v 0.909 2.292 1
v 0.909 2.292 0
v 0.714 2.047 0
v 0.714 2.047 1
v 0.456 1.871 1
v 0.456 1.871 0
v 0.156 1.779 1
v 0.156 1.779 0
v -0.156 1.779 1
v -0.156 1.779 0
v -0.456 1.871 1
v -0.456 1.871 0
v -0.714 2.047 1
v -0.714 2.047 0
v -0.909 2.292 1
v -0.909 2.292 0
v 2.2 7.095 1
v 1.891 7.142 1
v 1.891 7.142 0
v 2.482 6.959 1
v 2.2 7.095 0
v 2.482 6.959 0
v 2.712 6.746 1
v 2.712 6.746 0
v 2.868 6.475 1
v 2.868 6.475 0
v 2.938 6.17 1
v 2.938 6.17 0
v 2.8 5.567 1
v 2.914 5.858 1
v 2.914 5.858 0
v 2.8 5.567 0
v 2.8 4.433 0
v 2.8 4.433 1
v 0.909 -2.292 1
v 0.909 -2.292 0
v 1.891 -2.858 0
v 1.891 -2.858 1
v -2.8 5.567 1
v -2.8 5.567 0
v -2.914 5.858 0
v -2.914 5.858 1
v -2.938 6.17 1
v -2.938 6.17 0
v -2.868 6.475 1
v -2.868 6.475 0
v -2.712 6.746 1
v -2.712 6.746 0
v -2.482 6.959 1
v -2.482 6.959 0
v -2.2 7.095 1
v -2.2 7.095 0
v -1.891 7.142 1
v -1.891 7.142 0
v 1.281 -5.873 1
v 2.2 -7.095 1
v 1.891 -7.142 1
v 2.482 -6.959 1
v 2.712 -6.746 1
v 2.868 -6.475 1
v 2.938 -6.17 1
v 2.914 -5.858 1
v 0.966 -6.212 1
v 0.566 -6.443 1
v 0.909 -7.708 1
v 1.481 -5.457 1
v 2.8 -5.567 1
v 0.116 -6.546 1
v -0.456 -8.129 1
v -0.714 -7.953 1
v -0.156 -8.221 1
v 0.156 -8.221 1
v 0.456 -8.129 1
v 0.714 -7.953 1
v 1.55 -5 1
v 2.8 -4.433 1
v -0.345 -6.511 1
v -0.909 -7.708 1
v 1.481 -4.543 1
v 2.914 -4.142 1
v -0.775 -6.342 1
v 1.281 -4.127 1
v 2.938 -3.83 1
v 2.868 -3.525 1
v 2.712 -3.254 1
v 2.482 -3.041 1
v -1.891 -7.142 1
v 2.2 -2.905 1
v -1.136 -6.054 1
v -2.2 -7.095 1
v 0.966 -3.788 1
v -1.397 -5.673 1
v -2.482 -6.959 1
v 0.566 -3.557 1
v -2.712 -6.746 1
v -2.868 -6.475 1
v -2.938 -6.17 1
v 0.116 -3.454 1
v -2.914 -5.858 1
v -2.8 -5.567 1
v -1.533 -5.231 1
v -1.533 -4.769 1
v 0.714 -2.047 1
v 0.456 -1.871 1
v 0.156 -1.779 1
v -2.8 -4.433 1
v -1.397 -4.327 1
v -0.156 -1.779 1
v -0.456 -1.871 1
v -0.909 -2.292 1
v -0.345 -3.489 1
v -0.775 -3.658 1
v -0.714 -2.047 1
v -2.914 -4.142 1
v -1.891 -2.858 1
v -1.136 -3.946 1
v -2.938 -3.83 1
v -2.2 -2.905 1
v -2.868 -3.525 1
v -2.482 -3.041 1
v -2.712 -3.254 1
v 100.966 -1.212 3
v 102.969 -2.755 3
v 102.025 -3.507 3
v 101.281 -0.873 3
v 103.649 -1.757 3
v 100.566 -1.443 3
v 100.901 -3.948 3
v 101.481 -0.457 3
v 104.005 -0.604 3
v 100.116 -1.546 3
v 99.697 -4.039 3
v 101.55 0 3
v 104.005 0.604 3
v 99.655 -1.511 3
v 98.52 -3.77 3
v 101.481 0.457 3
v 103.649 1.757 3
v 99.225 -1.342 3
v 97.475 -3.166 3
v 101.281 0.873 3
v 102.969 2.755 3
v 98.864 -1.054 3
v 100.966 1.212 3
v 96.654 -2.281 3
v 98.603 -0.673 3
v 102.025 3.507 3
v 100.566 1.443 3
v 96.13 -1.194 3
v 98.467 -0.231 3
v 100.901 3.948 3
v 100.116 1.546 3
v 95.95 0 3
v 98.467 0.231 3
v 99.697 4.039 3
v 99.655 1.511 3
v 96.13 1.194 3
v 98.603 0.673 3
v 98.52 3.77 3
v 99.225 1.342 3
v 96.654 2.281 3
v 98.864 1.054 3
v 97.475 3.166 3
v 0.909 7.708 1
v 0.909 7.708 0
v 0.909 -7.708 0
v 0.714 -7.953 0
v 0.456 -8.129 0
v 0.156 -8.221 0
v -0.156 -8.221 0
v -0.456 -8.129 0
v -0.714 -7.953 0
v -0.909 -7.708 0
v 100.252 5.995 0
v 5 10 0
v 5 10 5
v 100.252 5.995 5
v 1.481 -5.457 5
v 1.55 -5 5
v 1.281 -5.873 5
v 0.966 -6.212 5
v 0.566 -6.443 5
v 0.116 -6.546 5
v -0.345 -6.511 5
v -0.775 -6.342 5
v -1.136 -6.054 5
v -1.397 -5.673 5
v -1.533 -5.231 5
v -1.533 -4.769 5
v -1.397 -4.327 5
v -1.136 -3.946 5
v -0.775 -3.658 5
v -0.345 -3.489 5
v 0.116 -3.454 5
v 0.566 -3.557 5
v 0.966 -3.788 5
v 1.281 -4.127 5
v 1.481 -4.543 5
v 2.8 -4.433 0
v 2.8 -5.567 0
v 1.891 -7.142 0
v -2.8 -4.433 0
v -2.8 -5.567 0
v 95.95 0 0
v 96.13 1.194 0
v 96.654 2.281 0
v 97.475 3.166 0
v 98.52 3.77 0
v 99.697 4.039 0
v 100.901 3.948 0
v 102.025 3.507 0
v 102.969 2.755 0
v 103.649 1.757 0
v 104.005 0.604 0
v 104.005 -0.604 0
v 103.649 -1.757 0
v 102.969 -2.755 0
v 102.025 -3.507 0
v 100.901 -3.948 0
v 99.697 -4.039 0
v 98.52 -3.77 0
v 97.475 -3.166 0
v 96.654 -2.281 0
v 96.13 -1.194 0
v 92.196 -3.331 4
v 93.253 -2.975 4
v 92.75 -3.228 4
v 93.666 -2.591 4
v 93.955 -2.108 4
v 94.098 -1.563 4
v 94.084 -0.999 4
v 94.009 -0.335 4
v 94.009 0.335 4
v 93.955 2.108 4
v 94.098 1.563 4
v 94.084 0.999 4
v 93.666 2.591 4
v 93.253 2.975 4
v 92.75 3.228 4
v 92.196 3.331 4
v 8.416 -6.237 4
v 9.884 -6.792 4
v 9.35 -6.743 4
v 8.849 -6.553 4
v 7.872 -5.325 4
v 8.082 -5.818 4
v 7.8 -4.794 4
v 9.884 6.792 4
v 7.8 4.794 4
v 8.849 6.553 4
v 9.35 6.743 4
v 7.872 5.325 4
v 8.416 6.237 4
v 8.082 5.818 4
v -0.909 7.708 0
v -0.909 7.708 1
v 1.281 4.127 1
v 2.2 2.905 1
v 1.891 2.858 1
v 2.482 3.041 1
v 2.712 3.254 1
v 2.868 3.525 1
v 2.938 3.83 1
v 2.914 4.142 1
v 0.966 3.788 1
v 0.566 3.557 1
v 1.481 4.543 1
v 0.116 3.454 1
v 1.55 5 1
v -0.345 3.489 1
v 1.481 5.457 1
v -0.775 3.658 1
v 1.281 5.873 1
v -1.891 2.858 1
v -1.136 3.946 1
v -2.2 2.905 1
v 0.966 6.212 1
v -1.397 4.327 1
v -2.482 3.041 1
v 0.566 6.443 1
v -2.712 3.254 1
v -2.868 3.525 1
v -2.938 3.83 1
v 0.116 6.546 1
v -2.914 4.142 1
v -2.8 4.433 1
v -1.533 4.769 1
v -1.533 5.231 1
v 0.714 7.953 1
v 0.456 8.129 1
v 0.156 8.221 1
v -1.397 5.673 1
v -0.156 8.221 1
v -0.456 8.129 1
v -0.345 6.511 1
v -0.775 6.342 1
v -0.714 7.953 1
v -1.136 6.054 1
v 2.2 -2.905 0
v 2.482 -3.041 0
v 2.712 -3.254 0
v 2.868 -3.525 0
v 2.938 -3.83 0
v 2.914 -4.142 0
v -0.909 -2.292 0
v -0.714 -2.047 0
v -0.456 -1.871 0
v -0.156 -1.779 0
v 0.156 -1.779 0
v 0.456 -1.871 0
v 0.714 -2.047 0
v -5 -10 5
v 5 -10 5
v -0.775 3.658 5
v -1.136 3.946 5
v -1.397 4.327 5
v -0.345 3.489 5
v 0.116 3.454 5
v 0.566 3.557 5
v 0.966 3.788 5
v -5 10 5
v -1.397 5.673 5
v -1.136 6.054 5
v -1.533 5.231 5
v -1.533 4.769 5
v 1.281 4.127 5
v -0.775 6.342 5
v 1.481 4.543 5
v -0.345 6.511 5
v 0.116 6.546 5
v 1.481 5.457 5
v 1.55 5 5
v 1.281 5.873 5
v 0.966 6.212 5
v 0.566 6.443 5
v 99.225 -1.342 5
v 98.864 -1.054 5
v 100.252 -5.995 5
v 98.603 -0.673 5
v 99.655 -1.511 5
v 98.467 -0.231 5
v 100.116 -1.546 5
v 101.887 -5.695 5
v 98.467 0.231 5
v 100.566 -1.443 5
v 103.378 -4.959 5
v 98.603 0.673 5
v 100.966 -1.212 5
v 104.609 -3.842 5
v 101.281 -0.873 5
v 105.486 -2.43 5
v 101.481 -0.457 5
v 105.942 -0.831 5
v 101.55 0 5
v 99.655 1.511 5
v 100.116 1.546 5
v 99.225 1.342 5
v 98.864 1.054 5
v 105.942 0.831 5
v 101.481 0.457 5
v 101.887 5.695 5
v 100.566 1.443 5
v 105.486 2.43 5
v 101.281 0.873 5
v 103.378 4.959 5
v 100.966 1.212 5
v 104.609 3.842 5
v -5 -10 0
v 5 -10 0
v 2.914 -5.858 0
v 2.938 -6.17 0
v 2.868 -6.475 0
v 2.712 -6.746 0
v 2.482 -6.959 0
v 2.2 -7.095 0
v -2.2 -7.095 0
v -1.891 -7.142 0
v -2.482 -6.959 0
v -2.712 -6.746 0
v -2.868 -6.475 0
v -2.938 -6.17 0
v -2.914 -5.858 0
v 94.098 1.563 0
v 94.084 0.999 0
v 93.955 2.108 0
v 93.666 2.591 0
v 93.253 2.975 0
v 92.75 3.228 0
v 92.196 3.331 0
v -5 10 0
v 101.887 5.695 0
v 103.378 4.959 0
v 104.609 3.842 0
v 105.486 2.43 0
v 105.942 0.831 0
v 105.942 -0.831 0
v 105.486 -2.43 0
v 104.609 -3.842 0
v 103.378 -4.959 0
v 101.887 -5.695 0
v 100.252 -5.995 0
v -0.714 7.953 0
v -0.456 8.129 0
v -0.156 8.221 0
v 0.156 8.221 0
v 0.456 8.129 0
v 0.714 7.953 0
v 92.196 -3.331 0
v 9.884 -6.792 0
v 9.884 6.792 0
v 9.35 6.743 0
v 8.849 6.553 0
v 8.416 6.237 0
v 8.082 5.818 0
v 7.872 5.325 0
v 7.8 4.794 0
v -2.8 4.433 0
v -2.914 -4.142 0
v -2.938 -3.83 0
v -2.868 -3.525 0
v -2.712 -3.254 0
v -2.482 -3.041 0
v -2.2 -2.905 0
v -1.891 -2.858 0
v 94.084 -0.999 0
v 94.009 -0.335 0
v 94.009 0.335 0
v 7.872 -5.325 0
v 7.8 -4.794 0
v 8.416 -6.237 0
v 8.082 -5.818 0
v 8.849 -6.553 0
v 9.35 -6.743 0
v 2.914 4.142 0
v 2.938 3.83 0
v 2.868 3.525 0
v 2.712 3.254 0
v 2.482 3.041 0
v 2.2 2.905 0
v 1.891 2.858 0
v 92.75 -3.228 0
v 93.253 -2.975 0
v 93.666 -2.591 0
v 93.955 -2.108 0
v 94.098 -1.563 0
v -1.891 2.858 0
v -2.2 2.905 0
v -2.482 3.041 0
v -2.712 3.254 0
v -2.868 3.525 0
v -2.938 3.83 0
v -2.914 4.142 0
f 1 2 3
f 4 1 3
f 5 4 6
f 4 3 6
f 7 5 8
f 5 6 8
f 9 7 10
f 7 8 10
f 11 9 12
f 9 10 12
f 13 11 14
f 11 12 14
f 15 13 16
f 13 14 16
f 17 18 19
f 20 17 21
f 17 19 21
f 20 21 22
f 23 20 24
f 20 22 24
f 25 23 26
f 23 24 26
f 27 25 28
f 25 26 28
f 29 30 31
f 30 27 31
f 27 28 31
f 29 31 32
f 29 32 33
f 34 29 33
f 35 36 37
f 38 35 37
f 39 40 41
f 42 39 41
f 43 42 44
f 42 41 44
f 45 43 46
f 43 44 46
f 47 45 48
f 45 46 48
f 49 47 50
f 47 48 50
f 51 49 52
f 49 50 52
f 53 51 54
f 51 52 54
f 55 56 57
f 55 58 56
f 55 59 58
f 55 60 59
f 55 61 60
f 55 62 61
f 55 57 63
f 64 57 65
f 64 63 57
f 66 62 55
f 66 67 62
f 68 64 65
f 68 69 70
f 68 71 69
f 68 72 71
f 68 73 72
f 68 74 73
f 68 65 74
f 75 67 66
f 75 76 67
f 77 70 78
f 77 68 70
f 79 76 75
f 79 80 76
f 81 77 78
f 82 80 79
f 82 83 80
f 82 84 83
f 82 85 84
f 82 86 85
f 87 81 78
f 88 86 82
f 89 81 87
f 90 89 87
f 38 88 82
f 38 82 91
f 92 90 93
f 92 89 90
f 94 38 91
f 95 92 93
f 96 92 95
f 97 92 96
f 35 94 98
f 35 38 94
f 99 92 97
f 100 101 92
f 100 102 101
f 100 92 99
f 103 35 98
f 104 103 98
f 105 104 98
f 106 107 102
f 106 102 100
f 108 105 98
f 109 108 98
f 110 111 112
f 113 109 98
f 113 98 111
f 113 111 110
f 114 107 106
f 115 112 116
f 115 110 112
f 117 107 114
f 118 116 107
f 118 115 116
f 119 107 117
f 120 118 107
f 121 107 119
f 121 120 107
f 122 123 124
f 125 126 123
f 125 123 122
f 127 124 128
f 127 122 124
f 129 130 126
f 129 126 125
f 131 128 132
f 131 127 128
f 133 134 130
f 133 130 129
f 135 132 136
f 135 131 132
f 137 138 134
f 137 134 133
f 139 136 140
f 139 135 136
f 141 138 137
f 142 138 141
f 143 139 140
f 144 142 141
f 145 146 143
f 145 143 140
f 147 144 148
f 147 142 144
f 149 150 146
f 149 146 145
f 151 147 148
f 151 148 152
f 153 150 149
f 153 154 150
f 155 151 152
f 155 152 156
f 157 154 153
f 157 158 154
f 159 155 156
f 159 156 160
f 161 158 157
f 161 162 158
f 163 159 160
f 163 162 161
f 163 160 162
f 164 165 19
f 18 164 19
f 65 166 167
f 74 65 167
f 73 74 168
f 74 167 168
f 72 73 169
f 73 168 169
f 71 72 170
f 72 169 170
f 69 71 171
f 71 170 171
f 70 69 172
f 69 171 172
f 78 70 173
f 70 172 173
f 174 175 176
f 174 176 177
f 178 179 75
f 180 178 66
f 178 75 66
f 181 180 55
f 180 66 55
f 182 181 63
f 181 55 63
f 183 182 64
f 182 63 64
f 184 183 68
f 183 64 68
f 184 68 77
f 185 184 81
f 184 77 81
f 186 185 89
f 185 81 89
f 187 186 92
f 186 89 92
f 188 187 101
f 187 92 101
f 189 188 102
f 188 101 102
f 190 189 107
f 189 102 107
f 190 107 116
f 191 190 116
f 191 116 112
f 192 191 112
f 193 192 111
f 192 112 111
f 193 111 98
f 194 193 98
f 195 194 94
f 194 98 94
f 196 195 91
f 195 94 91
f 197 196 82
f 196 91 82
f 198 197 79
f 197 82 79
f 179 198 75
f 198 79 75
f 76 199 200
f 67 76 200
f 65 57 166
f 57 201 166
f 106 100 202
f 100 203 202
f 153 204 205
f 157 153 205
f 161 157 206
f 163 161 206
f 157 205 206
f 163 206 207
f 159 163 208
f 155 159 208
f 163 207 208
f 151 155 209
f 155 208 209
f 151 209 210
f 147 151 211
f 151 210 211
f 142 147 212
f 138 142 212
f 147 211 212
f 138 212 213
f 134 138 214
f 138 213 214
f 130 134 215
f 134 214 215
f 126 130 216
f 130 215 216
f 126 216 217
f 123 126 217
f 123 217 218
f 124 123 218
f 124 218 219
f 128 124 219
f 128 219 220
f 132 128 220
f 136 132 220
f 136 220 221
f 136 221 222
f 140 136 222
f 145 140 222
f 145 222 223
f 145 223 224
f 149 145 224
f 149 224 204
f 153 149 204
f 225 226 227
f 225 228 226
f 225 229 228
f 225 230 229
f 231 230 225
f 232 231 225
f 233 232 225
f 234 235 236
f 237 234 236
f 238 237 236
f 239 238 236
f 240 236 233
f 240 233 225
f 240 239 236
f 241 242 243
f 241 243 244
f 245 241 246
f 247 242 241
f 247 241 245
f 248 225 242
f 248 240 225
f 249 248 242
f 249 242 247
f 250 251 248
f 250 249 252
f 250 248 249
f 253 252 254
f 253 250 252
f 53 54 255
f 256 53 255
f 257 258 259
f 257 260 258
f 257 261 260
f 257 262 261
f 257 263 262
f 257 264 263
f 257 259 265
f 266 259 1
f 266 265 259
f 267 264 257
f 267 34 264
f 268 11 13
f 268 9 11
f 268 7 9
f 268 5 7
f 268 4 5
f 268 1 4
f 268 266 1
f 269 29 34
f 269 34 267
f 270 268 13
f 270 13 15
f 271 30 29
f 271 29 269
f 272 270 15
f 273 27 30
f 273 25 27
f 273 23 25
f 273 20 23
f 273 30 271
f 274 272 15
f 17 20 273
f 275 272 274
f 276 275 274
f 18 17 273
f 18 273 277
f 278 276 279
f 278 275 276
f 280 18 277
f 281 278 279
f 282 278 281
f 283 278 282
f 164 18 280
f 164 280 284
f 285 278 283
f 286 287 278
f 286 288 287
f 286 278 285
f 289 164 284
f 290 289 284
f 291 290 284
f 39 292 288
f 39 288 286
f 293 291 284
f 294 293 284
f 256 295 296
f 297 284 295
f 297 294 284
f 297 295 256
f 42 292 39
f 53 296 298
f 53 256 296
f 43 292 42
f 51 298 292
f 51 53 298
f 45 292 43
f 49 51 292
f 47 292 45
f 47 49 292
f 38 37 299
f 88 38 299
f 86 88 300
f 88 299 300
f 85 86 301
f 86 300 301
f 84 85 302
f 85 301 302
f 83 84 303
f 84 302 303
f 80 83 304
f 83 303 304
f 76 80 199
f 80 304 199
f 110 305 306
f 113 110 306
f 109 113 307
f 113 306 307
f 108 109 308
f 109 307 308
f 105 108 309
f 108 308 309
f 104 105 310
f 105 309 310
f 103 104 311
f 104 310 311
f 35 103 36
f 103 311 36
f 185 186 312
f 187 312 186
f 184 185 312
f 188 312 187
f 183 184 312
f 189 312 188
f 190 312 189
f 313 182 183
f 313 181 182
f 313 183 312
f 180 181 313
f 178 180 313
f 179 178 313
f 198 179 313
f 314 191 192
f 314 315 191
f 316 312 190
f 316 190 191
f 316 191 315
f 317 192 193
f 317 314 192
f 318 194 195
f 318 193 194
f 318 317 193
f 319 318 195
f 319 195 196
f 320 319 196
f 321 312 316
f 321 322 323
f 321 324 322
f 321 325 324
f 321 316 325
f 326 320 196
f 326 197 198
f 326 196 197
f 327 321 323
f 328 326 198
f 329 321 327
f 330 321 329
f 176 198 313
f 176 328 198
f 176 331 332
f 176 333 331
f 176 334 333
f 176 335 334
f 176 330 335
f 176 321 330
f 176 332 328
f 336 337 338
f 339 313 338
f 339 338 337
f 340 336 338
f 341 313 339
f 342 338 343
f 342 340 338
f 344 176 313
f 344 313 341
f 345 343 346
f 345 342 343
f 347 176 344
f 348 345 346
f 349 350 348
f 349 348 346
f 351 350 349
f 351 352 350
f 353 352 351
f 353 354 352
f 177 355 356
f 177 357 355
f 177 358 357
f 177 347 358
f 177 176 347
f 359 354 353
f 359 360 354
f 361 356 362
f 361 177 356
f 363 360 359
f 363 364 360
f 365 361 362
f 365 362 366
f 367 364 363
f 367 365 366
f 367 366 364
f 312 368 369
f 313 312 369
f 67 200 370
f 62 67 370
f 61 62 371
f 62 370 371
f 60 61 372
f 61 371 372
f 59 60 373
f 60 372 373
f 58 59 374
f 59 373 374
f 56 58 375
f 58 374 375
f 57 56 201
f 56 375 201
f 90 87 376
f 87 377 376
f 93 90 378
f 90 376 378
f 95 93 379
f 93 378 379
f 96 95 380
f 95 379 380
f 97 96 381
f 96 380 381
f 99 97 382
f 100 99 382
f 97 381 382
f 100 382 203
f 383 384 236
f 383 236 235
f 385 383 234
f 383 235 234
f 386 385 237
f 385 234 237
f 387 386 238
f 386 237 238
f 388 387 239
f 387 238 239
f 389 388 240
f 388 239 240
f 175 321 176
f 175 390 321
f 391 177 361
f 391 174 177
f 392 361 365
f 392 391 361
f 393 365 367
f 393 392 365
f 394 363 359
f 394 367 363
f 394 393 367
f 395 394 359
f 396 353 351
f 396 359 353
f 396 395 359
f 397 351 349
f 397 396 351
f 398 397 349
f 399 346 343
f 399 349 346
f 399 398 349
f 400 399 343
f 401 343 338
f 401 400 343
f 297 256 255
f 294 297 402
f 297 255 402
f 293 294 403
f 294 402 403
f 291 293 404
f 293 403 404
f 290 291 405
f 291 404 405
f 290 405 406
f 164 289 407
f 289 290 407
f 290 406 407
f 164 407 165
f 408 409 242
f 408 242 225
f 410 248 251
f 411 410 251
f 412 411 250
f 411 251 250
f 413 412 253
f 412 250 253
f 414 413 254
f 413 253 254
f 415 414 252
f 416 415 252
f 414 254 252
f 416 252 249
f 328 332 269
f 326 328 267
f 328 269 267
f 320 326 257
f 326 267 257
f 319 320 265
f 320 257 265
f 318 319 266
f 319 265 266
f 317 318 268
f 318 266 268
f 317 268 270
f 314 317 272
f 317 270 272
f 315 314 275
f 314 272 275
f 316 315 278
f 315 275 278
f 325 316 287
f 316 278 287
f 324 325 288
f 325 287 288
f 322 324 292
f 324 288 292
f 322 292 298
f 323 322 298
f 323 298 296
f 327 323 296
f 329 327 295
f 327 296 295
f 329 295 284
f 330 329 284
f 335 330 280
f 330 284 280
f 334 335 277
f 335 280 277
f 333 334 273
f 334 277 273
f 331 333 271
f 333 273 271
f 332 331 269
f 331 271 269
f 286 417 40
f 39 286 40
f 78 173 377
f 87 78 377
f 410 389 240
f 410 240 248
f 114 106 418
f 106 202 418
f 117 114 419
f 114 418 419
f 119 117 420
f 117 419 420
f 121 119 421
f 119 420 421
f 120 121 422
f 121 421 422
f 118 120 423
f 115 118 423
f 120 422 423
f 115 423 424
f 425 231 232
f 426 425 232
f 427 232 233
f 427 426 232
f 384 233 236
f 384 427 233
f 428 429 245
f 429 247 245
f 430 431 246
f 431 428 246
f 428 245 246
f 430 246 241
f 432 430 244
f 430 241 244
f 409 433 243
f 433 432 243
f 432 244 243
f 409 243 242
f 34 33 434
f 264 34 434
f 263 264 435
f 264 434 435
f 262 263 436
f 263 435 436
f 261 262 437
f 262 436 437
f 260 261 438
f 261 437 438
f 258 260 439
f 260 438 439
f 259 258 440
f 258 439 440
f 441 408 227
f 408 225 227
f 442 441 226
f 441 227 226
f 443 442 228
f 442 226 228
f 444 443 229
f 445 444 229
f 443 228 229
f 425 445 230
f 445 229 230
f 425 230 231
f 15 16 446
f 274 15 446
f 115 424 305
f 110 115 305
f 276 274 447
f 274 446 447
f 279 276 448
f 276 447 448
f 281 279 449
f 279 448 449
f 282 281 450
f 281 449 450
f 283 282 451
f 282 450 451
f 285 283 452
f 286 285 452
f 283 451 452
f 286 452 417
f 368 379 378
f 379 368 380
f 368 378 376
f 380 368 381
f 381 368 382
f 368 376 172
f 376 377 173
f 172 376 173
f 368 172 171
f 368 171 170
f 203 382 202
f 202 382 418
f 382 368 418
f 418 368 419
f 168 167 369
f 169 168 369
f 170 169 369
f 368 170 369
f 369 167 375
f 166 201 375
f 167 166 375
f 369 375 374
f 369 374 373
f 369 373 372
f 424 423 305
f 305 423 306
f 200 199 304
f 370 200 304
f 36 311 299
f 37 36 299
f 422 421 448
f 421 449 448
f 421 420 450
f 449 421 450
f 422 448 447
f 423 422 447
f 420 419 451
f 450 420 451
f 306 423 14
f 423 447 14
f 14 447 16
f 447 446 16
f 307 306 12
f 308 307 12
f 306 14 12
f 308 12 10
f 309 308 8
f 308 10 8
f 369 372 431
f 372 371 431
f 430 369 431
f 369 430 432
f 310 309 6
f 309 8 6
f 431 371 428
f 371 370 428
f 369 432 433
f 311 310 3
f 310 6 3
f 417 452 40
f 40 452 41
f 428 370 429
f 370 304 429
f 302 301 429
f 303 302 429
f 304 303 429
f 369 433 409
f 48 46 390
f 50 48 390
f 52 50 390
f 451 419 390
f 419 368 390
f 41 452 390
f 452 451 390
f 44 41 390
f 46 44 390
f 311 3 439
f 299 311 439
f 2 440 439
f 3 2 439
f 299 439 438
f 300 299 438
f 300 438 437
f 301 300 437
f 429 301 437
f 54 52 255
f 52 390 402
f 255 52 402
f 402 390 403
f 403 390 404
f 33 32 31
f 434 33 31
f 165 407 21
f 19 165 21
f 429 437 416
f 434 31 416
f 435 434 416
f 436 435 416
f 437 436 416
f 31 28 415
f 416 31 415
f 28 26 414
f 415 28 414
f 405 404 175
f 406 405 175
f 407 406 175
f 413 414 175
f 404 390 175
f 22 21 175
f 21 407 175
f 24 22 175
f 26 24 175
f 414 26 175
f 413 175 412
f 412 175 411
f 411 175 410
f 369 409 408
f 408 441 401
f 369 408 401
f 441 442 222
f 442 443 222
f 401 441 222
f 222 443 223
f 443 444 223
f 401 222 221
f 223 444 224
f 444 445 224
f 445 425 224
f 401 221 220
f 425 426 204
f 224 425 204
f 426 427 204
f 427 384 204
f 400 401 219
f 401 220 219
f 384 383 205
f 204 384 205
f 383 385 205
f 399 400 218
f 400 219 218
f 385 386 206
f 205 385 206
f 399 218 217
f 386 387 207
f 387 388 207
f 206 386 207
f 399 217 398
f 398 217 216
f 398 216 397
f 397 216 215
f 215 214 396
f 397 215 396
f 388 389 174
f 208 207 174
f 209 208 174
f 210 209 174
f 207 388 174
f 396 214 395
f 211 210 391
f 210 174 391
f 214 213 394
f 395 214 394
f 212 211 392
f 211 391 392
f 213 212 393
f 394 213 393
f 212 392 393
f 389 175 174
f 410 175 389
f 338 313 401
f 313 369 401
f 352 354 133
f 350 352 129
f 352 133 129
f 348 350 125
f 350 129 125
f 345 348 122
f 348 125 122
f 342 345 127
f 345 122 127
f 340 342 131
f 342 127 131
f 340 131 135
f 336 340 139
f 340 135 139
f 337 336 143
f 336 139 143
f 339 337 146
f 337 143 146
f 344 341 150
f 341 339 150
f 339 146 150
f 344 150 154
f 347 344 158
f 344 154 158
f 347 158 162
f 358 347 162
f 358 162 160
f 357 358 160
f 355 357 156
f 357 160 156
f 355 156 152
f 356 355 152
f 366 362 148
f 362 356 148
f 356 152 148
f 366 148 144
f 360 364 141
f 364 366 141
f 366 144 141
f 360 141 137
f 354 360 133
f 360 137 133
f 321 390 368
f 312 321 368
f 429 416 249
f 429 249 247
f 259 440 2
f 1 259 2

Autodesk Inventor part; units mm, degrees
ref_plane "YZ Plane" through (0, 0, 0) normal (1, 0, 0) x (0, 1, 0)
ref_plane "XZ Plane" through (0, 0, 0) normal (0, 1, 0) x (-1, 0, 0)
ref_plane "XY Plane" through (0, 0, 0) normal (0, 0, 1) x (1, 0, 0)
sketch "スケッチ1" plane through (0, 0, 0) normal (0, 0, 1) x (1, 0, 0)
  circle A0 centre (0, 5) radius 1.55
  circle A1 centre (0, -5) radius 1.55
  line L0 (0, 5) -> (0, -5) construction
  line L1 (0, 0) -> (100, 0) construction
  circle A2 centre (100, 0) radius 1.55
  line L2 (-5, 10) -> (-5, -10)
  line L3 (-5, -10) -> (5, -10)
  line L4 (5, -10) -> (100.2521, -5.9947)
  line L5 (-5, 10) -> (5, 10)
  line L6 (5, 10) -> (100.2521, 5.9947)
  arc A3 (100.2521, -5.9947) -> (100.2521, 5.9947) centre (100, 0) ccw
  circle A4 centre (0, 5) radius 3 construction
  circle A5 centre (0, 5) radius 5 construction
  line L7 (5, 10) -> (5, -10) construction
  point P0 (-5, 0)
  dimension "d0" = 10
  dimension "d1" = 3.1
  dimension "d2" = 3.1
  dimension "d3" = 100
  dimension "d4" = 6
  dimension "d5" = 6
  dimension "d6" = 2
extrude "押し出し1" add sketch "スケッチ1" along normal blind 5
sketch "スケッチ2" plane through (0, 0, 0) normal (0, 0, -1) x (-1, 0, 0)
  circle A0 centre (-100, 0) radius 1.55 projected
  arc A1 (-100.2521, 5.9947) -> (-100.2521, -5.9947) centre (-100, 0) ccw projected
  circle A2 centre (-100, 0) radius 4.05
  point P0 (0, 0)
  dimension "d9" = 8.1
extrude "押し出し2" cut sketch "スケッチ2" against normal blind 3
sketch "スケッチ3" plane through (0, 0, 0) normal (0, 0, -1) x (-1, 0, 0)
  circle A0 centre (0, -5) radius 1.55 projected
  circle A1 centre (0, 5) radius 1.55 projected
  line L0 (0, -1.8246) -> (2.75, -3.4123)
  line L1 (2.75, -3.4123) -> (2.75, -6.5877)
  line L2 (2.75, -6.5877) -> (0, -8.1754)
  line L3 (0, -8.1754) -> (-2.75, -6.5877)
  line L4 (-2.75, -6.5877) -> (-2.75, -3.4123)
  line L5 (-2.75, -3.4123) -> (0, -1.8246)
  line L6 (-2.75, 6.5877) -> (0, 8.1754)
  line L7 (0, 8.1754) -> (2.75, 6.5877)
  line L8 (2.75, 6.5877) -> (2.75, 3.4123)
  line L9 (2.75, 3.4123) -> (0, 1.8246)
  line L10 (0, 1.8246) -> (-2.75, 3.4123)
  line L11 (-2.75, 3.4123) -> (-2.75, 6.5877)
  line L12 (0, -8.2332) -> (2.8, -6.6166)
  line L13 (2.8, -6.6166) -> (2.8, -3.3834)
  line L14 (2.8, -3.3834) -> (0, -1.7668)
  line L15 (0, -1.7668) -> (-2.8, -3.3834)
  line L16 (-2.8, -3.3834) -> (-2.8, -6.6166)
  line L17 (-2.8, -6.6166) -> (0, -8.2332)
  line L18 (-2.8, 3.3834) -> (0, 1.7668)
  line L19 (0, 1.7668) -> (2.8, 3.3834)
  line L20 (2.8, 3.3834) -> (2.8, 6.6166)
  line L21 (2.8, 6.6166) -> (0, 8.2332)
  line L22 (0, 8.2332) -> (-2.8, 6.6166)
  line L23 (-2.8, 6.6166) -> (-2.8, 3.3834)
  circle A2 centre (0, -7.1832) radius 1.05
  circle A3 centre (1.8907, -6.0916) radius 1.05
  circle A4 centre (1.8907, -3.9084) radius 1.05
  circle A5 centre (0, -2.8168) radius 1.05
  circle A6 centre (-1.8907, -3.9084) radius 1.05
  circle A7 centre (-1.8907, -6.0916) radius 1.05
  circle A8 centre (0, 2.8168) radius 1.05
  circle A9 centre (1.8907, 3.9084) radius 1.05
  circle A10 centre (1.8907, 6.0916) radius 1.05
  circle A11 centre (0, 7.1832) radius 1.05
  circle A12 centre (-1.8907, 6.0916) radius 1.05
  circle A13 centre (-1.8907, 3.9084) radius 1.05
  point P0 (0, 0)
  point P1 (2.8, -6.6166)
  point P2 (2.8, -3.3834)
  point P3 (0, -1.7668)
  point P4 (-2.8, -3.3834)
  point P5 (-2.8, -6.6166)
  point P6 (2.8, 3.3834)
  point P7 (2.8, 6.6166)
  point P8 (0, 8.2332)
  point P9 (-2.8, 6.6166)
  point P10 (-2.8, 3.3834)
  dimension "d16" = 2.1
  dimension "d15" = 5.5
  dimension "d17" = 0.05
  dimension "d20" = 360
  dimension "d24" = 360
extrude "押し出し3" cut sketch "スケッチ3" against normal blind 1
sketch "スケッチ4" plane through (0, 0, 0) normal (0, 0, -1) x (-1, 0, 0)
  circle A0 centre (-100, 0) radius 4.05 projected
  line L0 (-100.2521, 5.9947) -> (-5, 10) projected
  arc A1 (-100.2521, 5.9947) -> (-100.2521, -5.9947) centre (-100, 0) ccw projected
  line L1 (-5, -10) -> (-100.2521, -5.9947) projected
  line L2 (-7.8, -6.8796) -> (-94.9345, -3.2157)
  line L3 (-5, -10) -> (-100.2521, -5.9947) projected
  arc A2 (-94.9345, -3.2157) -> (-94.9345, 3.2157) centre (-100, 0) ccw
  line L4 (-94.9345, 3.2157) -> (-7.8, 6.8796)
  line L5 (-7.8, 6.8796) -> (-7.8, -6.8796)
  point P0 (-2.8, 4.4334)
  point P1 (0, 0)
  dimension "d26" = 3
  dimension "d27" = 3
  dimension "d28" = 5
extrude "押し出し4" cut sketch "スケッチ4" against normal blind 4 contours L2 A2 L4 L5
fillet "フィレット1" radius 2 4 edges at (7.8, 6.8796, 2) (7.8, -6.8796, 2) (94.9345, 3.2157, 2) (94.9345, -3.2157, 2)
equation "\"d27\" = d26"
properties part number "胴体_サブフレーム_1_12" material "アセタール樹脂、黒"
